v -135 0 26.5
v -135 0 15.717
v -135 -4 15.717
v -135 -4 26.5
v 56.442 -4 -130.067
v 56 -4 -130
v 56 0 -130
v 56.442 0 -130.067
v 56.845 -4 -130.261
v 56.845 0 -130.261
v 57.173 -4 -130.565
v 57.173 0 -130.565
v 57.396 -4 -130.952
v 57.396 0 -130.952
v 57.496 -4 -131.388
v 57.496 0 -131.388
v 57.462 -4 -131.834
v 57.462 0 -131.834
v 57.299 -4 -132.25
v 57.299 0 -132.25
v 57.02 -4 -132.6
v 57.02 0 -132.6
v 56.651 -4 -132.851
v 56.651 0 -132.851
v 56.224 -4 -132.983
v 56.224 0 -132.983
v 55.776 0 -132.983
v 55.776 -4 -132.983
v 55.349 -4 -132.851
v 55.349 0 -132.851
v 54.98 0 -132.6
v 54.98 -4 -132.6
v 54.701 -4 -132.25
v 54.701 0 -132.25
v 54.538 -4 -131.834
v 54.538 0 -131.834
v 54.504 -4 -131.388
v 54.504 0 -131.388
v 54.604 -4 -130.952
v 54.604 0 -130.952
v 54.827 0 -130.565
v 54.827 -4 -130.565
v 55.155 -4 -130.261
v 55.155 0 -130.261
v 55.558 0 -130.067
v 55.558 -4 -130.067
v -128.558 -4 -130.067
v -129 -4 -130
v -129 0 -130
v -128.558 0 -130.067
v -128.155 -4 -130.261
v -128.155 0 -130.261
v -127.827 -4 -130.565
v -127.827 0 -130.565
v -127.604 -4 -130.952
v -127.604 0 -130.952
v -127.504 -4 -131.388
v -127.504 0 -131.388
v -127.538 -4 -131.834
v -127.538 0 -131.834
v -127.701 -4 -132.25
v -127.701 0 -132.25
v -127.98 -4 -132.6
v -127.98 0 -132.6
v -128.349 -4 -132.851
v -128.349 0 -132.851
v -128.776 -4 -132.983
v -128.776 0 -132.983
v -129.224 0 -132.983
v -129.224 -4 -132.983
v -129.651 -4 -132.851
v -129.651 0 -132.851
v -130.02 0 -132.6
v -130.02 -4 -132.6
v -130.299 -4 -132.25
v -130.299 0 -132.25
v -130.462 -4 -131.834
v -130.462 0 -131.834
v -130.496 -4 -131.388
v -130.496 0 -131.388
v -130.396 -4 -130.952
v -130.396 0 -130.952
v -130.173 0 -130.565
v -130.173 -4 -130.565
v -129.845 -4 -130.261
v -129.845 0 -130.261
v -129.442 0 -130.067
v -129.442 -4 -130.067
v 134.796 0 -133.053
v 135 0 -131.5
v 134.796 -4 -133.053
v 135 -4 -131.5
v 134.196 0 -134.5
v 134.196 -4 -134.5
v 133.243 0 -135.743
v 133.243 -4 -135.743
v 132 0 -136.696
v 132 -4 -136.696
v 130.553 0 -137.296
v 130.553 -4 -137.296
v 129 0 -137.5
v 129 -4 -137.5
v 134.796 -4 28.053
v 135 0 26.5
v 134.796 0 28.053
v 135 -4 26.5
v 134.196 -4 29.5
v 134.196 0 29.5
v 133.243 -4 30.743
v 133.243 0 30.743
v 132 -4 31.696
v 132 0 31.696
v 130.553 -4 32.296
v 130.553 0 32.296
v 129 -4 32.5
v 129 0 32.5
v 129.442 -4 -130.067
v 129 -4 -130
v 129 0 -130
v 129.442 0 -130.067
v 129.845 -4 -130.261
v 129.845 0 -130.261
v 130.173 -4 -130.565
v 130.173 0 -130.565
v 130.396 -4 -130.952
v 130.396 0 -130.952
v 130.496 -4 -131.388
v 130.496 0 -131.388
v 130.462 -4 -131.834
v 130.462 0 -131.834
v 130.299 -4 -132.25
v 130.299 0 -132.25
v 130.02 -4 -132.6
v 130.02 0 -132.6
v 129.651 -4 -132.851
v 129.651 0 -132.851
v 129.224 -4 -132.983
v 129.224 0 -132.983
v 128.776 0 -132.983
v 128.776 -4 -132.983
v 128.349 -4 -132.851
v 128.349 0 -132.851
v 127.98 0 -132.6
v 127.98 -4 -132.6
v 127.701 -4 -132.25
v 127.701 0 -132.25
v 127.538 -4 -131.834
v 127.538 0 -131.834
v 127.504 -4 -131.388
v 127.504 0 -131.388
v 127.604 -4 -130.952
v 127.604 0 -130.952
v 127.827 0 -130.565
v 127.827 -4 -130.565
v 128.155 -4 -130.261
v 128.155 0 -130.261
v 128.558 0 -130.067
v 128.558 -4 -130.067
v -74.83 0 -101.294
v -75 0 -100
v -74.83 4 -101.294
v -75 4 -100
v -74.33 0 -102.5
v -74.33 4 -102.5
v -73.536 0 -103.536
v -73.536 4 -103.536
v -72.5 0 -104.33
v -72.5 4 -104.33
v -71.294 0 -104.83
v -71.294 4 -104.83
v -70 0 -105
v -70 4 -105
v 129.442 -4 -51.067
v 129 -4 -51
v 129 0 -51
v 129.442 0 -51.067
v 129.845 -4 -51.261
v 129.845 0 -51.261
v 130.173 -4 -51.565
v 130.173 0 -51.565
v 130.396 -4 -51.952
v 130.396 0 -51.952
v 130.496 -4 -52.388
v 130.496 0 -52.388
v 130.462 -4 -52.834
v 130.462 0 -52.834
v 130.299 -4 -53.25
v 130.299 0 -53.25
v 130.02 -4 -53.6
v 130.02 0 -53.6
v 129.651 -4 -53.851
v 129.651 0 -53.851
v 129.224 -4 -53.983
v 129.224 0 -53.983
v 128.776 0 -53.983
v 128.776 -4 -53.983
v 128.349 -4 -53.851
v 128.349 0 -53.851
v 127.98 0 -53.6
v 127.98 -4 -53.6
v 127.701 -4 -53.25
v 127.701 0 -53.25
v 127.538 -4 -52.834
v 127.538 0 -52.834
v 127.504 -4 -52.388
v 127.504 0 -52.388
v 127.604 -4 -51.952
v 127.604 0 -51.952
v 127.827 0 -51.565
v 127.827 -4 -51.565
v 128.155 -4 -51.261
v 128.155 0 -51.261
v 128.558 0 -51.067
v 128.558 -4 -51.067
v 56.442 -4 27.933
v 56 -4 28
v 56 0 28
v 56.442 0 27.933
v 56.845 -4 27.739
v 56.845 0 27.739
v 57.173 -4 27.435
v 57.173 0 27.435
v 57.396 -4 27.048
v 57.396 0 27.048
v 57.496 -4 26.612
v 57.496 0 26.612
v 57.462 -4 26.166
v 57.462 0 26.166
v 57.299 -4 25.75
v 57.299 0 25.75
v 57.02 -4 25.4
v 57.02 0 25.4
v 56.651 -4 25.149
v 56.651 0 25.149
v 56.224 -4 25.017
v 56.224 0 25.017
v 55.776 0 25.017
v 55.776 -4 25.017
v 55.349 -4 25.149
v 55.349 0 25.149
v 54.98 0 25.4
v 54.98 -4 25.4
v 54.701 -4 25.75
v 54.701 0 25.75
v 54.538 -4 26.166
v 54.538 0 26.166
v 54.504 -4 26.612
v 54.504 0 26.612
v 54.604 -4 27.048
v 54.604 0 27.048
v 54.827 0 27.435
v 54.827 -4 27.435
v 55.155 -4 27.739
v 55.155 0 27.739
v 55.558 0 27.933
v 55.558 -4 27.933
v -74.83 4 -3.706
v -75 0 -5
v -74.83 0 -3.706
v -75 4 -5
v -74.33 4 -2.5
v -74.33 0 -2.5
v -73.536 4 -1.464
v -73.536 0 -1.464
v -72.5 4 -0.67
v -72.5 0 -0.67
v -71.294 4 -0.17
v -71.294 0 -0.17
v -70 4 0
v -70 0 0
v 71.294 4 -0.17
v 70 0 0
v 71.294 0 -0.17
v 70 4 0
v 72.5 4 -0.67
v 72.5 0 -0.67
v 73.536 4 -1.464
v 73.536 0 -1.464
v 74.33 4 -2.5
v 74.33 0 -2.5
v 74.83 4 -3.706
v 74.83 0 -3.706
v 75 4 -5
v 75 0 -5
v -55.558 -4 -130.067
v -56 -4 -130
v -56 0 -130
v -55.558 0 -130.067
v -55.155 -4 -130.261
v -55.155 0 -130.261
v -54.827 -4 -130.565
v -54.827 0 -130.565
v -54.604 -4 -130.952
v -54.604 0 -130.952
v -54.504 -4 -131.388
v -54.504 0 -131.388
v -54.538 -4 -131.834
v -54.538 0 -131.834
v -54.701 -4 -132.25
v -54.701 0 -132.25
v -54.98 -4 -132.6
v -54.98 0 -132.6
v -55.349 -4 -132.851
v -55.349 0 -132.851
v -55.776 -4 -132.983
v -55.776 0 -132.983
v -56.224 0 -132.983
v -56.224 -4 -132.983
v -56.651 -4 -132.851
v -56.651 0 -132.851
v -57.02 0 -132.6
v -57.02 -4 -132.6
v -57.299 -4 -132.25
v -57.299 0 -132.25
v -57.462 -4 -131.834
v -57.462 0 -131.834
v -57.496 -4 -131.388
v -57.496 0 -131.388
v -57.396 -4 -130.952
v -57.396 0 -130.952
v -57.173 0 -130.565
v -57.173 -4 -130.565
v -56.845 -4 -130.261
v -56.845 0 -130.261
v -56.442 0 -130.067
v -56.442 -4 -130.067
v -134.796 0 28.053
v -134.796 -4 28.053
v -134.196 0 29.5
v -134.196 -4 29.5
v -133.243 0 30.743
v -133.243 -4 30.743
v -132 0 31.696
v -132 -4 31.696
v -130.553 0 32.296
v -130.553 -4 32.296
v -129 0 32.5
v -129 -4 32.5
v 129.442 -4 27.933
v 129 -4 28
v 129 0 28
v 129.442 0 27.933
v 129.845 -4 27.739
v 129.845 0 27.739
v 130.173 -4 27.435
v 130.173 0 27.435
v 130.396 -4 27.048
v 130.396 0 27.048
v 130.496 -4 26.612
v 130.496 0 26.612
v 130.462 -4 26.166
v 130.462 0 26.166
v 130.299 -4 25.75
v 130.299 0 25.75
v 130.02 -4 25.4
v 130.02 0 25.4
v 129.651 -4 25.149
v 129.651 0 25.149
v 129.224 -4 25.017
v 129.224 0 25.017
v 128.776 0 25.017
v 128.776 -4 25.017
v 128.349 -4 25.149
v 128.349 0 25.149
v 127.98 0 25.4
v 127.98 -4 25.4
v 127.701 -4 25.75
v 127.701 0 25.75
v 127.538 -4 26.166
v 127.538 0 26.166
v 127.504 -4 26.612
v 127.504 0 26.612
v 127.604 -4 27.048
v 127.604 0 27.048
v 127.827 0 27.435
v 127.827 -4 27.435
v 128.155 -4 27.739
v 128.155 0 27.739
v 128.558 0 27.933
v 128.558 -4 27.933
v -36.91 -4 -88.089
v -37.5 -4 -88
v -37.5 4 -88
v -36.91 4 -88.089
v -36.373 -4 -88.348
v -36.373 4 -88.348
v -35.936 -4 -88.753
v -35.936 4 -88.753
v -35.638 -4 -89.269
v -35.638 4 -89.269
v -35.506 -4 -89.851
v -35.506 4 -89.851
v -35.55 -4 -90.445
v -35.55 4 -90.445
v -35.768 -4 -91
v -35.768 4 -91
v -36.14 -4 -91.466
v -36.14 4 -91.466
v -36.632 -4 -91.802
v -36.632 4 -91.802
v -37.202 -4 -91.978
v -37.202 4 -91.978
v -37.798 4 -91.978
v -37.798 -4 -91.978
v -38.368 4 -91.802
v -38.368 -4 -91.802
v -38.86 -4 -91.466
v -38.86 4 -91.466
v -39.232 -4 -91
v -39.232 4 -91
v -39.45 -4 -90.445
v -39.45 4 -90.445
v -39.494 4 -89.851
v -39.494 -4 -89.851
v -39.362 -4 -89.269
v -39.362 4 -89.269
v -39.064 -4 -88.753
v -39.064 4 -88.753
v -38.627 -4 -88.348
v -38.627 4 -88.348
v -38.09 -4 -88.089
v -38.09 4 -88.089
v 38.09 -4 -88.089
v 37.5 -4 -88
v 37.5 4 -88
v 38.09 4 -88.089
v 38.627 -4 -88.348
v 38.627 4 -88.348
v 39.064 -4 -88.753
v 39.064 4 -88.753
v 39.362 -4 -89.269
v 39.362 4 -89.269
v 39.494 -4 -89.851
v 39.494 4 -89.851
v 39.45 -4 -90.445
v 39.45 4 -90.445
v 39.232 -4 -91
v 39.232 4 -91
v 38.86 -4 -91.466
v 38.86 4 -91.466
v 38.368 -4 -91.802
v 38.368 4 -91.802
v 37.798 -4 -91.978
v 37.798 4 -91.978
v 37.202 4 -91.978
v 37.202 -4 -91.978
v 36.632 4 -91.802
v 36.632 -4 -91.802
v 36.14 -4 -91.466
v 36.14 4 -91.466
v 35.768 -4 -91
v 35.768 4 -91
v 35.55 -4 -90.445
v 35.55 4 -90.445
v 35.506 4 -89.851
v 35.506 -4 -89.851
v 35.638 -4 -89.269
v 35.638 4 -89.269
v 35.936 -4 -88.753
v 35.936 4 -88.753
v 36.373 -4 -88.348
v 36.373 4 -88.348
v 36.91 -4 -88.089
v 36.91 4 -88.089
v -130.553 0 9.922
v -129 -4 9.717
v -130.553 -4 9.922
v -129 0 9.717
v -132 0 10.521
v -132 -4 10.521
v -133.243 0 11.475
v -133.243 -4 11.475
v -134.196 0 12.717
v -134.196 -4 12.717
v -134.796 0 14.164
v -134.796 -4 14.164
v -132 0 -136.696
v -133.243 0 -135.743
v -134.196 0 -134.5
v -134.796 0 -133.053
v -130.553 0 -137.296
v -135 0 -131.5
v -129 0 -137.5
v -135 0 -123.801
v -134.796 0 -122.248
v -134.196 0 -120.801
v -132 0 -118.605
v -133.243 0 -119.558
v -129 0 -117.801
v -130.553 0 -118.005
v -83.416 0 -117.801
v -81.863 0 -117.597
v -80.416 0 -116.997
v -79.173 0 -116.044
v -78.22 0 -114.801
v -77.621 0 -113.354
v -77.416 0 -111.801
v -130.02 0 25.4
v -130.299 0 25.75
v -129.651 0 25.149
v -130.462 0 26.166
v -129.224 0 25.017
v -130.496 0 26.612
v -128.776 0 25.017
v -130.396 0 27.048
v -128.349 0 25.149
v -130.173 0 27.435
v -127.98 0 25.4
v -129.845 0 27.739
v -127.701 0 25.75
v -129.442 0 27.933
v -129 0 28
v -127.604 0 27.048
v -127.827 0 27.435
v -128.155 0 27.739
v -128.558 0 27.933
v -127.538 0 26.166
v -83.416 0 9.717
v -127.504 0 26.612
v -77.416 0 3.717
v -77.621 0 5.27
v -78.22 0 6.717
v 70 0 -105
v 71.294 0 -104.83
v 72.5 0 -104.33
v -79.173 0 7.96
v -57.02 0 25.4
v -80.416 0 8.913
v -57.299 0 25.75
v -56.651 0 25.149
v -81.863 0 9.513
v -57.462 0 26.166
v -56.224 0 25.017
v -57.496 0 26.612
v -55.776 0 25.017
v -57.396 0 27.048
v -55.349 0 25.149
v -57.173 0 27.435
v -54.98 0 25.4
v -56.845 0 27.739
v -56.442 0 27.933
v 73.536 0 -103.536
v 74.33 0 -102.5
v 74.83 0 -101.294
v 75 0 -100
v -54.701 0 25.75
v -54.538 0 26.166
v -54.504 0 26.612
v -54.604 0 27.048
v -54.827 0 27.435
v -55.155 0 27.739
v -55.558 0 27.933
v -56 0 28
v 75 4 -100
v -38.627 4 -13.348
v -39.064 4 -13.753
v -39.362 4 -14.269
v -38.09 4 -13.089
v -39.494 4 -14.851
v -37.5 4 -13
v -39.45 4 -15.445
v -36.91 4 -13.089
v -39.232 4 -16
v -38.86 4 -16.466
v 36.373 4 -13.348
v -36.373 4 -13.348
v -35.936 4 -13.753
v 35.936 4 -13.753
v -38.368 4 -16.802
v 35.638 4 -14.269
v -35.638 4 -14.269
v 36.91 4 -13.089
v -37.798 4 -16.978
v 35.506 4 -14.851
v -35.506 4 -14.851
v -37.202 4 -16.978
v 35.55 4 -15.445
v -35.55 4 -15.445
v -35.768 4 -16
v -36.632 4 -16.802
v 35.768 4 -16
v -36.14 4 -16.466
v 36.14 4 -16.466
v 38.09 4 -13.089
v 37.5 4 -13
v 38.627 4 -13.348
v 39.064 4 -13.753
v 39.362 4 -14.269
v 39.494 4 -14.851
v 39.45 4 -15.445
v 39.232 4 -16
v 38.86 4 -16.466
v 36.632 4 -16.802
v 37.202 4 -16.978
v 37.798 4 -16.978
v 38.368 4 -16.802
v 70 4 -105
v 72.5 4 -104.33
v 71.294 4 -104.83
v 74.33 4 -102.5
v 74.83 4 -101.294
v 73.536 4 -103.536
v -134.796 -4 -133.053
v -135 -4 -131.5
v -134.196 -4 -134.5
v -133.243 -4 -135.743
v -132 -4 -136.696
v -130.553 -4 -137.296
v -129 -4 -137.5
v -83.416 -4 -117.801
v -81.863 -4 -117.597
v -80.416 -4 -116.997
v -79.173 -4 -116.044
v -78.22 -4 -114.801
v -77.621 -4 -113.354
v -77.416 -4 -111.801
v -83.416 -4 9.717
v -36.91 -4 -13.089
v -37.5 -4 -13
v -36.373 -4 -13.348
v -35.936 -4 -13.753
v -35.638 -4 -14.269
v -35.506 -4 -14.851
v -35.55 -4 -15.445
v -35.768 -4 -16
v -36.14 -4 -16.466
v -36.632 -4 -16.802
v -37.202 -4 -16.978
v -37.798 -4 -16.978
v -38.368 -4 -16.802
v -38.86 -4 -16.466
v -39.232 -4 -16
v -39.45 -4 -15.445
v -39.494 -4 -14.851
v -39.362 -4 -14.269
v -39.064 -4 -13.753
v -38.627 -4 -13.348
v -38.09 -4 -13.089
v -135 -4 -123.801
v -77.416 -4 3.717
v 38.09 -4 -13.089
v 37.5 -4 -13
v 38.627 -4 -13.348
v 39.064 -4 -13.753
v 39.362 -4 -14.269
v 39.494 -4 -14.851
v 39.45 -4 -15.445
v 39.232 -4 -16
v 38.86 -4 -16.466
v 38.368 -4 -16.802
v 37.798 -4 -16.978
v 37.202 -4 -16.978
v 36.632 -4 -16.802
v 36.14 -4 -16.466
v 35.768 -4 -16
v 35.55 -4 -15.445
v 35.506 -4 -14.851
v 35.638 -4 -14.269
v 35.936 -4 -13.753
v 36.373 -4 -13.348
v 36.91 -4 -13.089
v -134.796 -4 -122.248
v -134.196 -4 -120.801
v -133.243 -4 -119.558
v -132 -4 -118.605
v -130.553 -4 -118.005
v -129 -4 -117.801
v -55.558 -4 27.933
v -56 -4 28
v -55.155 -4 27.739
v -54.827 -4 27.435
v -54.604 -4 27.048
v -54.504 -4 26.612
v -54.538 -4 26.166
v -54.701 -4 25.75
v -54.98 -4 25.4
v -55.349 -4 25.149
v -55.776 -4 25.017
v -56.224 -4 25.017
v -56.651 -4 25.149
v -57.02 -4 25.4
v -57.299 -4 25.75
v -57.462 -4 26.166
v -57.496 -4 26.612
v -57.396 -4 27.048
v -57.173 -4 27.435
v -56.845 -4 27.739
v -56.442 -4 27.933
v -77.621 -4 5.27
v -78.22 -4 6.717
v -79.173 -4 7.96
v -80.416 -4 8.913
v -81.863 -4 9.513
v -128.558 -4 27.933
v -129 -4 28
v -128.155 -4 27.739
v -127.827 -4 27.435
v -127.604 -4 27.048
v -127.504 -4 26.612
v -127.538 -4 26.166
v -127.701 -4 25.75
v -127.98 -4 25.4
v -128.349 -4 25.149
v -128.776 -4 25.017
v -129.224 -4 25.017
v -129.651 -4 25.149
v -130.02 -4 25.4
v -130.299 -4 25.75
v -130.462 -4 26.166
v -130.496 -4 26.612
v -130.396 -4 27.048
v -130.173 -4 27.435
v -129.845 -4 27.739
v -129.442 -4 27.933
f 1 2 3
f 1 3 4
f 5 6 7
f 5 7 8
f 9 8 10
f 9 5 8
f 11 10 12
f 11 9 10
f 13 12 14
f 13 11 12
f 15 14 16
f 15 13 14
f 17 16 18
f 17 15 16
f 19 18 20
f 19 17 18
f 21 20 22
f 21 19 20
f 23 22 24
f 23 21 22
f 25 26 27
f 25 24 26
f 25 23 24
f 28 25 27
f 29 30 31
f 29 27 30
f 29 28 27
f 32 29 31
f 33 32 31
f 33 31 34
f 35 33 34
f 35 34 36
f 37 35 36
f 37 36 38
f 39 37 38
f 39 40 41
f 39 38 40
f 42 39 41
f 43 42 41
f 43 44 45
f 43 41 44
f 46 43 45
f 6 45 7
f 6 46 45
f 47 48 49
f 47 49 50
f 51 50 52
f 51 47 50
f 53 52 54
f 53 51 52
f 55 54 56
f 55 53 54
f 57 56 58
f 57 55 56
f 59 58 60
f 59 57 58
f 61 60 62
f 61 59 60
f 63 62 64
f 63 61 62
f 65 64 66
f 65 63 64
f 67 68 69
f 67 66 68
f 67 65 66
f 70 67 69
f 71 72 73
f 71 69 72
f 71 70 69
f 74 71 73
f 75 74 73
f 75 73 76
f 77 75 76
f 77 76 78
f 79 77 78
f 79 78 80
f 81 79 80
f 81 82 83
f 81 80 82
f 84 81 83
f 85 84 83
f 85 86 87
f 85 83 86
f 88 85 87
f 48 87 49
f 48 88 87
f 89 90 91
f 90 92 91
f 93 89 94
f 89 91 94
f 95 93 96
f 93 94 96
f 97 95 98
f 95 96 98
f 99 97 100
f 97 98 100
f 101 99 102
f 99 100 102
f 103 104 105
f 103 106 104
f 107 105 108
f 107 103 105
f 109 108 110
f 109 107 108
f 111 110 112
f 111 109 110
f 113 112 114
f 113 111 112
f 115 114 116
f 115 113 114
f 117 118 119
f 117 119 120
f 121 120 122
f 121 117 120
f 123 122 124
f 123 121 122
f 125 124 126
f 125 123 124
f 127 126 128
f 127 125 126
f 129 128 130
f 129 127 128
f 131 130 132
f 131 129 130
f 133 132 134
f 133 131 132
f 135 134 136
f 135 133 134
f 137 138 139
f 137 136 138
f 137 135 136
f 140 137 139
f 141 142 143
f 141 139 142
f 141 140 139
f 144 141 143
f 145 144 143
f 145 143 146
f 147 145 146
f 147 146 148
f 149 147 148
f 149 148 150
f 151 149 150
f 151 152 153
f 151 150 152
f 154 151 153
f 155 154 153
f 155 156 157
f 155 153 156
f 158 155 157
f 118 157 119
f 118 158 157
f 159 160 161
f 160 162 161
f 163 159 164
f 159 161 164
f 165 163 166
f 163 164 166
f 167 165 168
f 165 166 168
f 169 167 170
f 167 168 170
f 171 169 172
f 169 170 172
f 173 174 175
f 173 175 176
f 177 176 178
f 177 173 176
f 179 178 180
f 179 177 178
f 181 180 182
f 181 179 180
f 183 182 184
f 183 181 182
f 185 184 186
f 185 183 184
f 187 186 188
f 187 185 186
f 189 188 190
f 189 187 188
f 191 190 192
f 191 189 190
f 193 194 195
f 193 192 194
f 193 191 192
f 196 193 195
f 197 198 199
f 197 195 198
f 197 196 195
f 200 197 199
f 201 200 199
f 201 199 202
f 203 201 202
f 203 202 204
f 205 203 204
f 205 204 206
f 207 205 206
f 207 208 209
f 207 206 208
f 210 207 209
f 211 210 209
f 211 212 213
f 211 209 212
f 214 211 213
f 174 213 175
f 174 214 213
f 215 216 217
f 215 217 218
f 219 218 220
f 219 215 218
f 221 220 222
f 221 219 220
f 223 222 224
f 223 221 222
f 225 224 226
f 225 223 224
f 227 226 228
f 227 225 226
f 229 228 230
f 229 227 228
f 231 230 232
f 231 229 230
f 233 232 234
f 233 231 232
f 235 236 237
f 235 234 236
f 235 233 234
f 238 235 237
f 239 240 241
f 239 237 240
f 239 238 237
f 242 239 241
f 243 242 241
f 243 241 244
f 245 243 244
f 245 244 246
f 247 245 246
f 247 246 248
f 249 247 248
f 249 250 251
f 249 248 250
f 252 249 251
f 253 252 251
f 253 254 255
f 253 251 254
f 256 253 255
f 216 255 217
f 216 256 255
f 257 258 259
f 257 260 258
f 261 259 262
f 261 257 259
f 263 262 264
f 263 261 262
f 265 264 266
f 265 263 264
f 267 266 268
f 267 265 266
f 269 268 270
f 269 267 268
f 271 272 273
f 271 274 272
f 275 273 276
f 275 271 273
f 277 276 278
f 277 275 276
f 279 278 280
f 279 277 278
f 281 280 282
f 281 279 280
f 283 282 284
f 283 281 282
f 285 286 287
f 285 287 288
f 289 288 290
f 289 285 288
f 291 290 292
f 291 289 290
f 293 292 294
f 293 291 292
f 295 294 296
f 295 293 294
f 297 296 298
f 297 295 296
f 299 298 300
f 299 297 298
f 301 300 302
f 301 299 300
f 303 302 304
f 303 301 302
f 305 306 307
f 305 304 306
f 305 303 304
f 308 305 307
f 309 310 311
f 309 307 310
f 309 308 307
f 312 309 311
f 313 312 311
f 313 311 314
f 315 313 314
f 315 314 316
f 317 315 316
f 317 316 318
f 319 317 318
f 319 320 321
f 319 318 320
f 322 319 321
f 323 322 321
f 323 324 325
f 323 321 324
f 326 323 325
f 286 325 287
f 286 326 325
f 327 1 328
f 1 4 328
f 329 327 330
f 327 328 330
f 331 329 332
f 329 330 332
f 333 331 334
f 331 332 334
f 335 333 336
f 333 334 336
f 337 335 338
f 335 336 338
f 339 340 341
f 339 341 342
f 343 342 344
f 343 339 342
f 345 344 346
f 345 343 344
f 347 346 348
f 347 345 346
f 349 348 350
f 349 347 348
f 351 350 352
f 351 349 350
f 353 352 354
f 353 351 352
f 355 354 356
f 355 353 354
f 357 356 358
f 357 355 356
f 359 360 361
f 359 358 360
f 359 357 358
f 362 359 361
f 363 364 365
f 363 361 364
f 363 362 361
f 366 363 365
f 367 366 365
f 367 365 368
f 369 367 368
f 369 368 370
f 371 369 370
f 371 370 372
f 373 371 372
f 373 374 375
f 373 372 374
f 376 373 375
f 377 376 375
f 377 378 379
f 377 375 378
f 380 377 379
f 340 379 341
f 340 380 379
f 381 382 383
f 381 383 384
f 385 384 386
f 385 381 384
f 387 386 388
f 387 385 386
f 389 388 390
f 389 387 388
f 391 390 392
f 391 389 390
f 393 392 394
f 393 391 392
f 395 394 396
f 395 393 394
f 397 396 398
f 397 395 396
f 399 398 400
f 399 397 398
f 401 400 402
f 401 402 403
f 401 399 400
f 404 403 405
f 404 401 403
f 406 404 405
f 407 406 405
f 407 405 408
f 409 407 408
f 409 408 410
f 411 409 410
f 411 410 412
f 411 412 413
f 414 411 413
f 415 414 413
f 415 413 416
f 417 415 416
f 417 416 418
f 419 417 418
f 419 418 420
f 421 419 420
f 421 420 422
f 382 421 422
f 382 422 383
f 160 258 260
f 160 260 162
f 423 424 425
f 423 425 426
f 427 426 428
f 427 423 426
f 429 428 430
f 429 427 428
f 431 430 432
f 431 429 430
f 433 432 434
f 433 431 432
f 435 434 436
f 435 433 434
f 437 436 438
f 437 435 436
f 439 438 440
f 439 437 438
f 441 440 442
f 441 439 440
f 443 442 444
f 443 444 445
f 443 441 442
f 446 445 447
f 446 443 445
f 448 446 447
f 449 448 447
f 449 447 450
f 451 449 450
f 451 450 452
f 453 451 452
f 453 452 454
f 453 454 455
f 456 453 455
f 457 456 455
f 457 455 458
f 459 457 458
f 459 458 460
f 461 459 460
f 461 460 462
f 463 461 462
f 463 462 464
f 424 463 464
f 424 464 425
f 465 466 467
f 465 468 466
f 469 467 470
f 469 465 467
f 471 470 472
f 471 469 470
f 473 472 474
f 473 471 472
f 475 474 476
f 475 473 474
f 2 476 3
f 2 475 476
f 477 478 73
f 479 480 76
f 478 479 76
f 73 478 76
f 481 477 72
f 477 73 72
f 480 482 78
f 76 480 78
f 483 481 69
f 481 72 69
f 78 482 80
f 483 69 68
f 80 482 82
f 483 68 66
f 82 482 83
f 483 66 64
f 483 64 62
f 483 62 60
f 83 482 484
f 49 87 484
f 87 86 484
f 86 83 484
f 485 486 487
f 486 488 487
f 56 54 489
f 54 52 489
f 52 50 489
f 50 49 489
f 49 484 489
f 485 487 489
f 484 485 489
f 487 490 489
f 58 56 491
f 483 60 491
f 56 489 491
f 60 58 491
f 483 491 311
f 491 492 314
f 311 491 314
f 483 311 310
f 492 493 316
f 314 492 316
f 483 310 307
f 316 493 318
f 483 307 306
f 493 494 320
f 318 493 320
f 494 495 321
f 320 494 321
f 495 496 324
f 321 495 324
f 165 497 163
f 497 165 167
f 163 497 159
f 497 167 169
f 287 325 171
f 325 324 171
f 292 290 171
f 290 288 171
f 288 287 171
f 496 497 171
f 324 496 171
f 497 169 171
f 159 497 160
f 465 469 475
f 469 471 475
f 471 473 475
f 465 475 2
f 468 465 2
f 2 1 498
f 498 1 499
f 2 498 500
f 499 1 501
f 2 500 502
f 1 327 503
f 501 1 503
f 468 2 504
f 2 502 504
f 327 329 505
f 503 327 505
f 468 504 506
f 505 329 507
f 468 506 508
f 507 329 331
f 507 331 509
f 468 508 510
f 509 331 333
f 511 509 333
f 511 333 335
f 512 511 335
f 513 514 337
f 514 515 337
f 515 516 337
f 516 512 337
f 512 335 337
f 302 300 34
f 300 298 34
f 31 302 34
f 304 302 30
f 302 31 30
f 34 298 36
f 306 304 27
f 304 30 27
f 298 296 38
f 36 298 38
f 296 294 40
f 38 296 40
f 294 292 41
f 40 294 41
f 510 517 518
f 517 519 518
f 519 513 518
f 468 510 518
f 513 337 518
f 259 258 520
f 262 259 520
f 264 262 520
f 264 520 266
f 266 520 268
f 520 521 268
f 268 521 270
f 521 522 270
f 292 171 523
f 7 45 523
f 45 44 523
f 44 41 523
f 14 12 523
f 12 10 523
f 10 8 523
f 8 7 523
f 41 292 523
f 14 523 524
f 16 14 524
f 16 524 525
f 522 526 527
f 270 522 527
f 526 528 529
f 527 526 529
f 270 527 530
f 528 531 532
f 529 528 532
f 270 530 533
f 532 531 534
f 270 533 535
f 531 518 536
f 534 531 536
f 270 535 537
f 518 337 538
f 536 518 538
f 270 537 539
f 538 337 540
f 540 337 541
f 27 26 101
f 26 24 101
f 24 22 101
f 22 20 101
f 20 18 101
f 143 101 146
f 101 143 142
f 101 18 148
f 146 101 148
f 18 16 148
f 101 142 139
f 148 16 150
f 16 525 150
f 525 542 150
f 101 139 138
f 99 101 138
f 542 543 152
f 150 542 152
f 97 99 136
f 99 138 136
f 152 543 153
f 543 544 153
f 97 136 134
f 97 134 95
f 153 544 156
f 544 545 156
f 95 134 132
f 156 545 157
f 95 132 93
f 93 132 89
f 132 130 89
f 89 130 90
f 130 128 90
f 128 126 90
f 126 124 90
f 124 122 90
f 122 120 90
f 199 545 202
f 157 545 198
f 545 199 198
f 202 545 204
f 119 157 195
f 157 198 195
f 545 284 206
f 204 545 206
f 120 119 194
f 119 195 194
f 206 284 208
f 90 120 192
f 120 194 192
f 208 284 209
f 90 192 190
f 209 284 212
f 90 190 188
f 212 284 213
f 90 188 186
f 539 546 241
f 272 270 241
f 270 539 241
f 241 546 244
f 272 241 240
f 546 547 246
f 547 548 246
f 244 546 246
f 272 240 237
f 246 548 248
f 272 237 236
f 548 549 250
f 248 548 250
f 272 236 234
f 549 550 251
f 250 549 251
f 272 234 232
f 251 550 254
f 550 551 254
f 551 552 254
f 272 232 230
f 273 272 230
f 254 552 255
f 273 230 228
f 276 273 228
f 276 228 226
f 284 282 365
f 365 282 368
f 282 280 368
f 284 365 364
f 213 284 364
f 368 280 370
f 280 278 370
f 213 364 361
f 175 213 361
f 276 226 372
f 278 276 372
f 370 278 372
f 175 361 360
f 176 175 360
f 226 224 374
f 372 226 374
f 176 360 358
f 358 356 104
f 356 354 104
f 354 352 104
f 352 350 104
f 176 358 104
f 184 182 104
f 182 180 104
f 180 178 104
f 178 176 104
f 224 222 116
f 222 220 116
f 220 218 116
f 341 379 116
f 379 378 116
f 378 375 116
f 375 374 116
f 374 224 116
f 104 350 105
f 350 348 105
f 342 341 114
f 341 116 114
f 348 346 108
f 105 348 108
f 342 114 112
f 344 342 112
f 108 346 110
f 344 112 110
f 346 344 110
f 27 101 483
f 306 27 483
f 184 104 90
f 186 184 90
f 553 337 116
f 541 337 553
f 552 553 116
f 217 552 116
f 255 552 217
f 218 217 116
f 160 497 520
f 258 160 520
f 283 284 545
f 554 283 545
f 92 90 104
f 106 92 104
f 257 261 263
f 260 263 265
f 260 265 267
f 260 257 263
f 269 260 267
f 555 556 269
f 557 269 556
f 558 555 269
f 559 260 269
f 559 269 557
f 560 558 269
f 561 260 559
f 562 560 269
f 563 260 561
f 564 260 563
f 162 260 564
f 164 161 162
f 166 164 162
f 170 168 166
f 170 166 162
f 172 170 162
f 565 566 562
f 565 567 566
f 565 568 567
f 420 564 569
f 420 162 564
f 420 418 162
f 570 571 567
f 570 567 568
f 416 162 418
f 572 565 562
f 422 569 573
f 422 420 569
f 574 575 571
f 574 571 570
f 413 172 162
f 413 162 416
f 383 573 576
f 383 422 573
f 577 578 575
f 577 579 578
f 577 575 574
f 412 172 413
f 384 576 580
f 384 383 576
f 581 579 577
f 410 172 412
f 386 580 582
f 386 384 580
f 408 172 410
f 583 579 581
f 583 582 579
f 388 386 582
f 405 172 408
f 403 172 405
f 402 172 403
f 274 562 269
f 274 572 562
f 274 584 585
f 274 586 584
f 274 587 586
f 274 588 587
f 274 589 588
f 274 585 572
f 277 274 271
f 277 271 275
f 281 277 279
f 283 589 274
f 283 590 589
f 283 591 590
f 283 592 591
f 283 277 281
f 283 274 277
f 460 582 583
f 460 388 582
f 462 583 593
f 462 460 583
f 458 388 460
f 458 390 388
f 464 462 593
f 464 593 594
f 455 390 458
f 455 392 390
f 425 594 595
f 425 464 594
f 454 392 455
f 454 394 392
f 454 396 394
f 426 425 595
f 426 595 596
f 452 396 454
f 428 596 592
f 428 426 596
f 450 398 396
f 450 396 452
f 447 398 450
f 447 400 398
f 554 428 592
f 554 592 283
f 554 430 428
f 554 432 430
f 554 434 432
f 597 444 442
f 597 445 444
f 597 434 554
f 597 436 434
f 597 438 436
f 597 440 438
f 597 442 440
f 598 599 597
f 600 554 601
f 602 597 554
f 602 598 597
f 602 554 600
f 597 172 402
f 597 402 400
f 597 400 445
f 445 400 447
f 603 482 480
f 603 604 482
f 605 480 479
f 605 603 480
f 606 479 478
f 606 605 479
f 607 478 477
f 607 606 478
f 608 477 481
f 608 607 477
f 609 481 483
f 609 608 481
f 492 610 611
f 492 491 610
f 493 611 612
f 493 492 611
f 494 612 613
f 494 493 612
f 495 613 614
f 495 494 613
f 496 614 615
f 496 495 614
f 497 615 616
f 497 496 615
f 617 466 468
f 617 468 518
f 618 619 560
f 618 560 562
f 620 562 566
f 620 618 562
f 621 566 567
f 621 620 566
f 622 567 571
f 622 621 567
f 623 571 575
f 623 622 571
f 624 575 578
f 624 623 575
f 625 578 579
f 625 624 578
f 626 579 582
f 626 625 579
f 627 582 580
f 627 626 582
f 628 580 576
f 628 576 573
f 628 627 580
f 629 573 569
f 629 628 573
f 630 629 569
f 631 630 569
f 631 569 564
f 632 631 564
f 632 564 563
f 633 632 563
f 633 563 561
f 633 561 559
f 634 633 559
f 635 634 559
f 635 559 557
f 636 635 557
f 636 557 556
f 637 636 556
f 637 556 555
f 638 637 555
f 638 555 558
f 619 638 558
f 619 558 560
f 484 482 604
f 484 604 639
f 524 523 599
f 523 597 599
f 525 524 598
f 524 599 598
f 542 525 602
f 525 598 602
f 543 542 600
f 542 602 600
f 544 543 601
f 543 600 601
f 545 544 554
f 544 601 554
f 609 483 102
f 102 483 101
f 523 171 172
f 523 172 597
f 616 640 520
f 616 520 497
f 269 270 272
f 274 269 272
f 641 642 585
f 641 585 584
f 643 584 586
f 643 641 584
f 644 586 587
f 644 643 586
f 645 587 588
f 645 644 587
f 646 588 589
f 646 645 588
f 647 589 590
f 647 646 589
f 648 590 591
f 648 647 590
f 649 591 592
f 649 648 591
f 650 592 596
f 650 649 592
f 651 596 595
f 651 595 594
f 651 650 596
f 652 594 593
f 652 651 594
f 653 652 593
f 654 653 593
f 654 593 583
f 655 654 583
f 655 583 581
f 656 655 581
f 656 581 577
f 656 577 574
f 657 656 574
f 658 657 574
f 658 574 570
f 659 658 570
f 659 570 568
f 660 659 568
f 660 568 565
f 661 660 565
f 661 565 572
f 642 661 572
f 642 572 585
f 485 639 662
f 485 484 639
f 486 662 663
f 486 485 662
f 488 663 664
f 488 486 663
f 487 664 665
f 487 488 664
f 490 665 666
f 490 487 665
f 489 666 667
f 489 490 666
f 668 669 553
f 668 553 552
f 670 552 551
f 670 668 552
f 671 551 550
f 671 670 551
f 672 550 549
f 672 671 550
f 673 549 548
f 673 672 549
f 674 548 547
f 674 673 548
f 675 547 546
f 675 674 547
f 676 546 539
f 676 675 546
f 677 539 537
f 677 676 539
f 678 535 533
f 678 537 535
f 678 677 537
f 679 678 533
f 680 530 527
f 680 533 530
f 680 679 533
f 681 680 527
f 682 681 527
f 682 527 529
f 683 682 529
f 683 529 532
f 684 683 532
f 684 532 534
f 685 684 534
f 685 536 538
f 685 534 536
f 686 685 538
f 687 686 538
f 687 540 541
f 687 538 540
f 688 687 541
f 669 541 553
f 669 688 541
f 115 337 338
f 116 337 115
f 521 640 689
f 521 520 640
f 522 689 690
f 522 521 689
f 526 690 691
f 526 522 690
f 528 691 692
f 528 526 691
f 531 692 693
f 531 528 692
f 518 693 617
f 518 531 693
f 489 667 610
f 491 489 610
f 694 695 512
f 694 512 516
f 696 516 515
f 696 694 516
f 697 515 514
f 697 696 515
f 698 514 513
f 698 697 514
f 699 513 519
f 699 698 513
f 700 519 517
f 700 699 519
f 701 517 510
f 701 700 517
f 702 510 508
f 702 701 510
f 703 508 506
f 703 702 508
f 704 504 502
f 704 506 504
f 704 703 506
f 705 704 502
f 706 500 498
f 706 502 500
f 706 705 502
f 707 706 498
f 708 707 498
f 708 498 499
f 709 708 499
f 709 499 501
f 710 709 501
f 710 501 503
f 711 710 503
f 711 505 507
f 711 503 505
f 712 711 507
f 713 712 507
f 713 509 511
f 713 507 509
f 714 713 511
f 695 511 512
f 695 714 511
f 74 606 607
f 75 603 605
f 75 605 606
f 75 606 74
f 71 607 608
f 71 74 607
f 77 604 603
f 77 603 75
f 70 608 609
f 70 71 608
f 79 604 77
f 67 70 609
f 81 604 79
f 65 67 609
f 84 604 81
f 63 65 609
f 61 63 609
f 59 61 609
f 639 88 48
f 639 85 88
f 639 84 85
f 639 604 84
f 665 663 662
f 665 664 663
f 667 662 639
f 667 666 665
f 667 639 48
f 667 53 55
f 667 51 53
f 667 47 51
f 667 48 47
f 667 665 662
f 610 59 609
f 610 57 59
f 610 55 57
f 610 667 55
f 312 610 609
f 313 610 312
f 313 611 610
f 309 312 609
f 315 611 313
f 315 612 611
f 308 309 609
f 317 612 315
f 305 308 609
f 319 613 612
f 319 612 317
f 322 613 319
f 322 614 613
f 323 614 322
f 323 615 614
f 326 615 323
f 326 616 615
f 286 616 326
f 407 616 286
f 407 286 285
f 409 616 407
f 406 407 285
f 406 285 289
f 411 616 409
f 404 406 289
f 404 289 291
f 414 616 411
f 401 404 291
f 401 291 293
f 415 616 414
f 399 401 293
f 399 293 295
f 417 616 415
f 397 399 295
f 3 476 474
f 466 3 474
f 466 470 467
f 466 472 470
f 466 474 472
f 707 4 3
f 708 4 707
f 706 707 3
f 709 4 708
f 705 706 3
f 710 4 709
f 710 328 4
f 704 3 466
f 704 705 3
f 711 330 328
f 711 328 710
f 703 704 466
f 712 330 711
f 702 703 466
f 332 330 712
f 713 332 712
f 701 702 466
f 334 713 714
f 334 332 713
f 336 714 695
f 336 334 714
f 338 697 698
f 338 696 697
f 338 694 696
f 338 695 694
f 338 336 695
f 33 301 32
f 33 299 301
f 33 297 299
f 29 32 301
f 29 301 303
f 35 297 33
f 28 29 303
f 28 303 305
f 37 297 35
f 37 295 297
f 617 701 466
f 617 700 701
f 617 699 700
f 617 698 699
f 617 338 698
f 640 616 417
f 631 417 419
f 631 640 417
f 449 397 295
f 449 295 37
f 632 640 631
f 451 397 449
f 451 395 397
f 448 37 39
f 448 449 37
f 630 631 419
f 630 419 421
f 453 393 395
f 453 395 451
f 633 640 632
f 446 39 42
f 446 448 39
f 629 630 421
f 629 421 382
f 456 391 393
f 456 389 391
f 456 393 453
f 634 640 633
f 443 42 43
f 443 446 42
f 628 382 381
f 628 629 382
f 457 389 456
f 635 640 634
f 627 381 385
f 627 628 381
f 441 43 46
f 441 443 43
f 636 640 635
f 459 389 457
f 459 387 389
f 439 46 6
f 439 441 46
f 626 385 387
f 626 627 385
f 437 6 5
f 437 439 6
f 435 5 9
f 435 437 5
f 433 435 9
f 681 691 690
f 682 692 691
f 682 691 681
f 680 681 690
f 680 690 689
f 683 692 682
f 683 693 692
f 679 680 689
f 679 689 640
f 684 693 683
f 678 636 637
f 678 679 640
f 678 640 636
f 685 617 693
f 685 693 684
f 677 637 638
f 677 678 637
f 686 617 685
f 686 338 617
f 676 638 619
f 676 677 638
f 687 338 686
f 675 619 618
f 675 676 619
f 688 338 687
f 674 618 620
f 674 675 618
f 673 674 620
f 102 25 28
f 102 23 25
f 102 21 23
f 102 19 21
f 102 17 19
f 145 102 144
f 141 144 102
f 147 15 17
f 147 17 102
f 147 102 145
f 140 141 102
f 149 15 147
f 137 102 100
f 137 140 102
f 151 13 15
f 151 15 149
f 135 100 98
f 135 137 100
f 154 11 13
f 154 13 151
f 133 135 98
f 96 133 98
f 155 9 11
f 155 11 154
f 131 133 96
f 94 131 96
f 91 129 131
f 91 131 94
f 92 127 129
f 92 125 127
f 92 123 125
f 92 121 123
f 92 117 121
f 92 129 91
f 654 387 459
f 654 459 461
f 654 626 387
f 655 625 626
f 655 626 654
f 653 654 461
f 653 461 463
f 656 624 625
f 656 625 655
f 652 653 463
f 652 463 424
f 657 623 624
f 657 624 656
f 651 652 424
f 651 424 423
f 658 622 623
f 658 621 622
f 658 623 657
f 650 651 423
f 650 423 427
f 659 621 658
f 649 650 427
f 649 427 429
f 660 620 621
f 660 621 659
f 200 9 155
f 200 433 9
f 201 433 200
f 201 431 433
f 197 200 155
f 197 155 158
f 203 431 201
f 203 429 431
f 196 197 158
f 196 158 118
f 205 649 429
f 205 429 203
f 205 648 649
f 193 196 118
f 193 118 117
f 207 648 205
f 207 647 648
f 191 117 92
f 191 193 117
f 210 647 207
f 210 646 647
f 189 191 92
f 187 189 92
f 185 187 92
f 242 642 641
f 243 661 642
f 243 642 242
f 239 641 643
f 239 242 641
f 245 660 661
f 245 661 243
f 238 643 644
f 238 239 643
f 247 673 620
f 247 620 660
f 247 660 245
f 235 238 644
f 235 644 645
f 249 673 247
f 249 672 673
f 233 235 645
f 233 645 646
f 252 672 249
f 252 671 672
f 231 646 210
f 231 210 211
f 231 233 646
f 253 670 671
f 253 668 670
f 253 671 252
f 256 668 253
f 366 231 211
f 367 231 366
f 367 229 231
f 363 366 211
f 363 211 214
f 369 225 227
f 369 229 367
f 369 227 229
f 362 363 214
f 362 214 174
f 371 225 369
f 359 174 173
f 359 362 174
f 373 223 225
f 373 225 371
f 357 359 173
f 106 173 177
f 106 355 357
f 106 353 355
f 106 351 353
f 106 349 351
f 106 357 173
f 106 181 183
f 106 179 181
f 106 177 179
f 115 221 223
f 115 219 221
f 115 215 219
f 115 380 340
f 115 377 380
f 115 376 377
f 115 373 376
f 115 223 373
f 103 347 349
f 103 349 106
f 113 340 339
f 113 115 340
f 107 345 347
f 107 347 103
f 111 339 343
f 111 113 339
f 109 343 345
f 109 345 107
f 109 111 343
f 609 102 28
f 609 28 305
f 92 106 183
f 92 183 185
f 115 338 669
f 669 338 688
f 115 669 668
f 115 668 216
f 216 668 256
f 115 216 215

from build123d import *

# Parameters (mm, degrees)
SKETCH_1_W               = 150
SKETCH_1_H               = 105
SKETCH_1_R               = 2
EXTRUDE_1_DEPTH          = 4
SKETCH_2_W               = 270
SKETCH_2_H               = 170
EXTRUDE_2_DEPTH          = 4
CUT_EXTRUDE_2_DEPTH      = 193.860701025
CUT_EXTRUDE_2_DEPTH_BACK = 193.860701025
SKETCH_3_R               = 2
FILLET_1_R               = 6
CUT_EXTRUDE_3_DEPTH      = 193.736218703
CUT_EXTRUDE_3_DEPTH_BACK = 193.736218703
SKETCH_4_R               = 1.5
CUT_EXTRUDE_4_DEPTH      = 193.736218703
CUT_EXTRUDE_4_DEPTH_BACK = 193.736218703
SKETCH_5_W               = 57.583887605
SKETCH_5_H               = 127.518164053
FILLET_2_R               = 6
FILLET_3_R               = 5


with BuildPart() as part:
    # 草图1 → 凸台-拉伸1 (new body)
    with BuildSketch(Plane(origin=(0, 0, 0), x_dir=(1, 0, 0), z_dir=(0, 1, 0))):
        with Locations((0, 52.5)):
            Rectangle(SKETCH_1_W, SKETCH_1_H)
        with Locations(Location((-37.5, 90, 0), (0, 0, 270))):
            Circle(SKETCH_1_R, mode=Mode.SUBTRACT)
        with Locations(Location((-37.5, 15, 0), (0, 0, 270))):
            Circle(SKETCH_1_R, mode=Mode.SUBTRACT)
        with Locations(Location((37.5, 15, 0), (0, 0, 270))):
            Circle(SKETCH_1_R, mode=Mode.SUBTRACT)
        with Locations(Location((37.5, 90, 0), (0, 0, 270))):
            Circle(SKETCH_1_R, mode=Mode.SUBTRACT)
    extrude(amount=EXTRUDE_1_DEPTH)

    # 草图2 → 凸台-拉伸2 (add)
    with BuildSketch(Plane.XZ):
        with Locations((0, -52.5)):
            Rectangle(SKETCH_2_W, SKETCH_2_H)
    extrude(amount=EXTRUDE_2_DEPTH)

    # 草图3 → 切除-拉伸2 (cut, two sides: drawn at the far end of the back side and taken through both)
    with BuildSketch(Plane(origin=(0, 4, 0), x_dir=(1, 0, 0), z_dir=(0, 1, 0)).offset(-CUT_EXTRUDE_2_DEPTH_BACK)):
        with Locations(Location((-37.5, 90, 0), (0, 0, 270))):
            Circle(SKETCH_3_R)
        with Locations(Location((37.5, 90, 0), (0, 0, 270))):
            Circle(SKETCH_3_R)
        with Locations(Location((-37.5, 15, 0), (0, 0, 270))):
            Circle(SKETCH_3_R)
        with Locations(Location((37.5, 15, 0), (0, 0, 270))):
            Circle(SKETCH_3_R)
    extrude(amount=CUT_EXTRUDE_2_DEPTH + CUT_EXTRUDE_2_DEPTH_BACK, mode=Mode.SUBTRACT)

    # 圆角1
    fillet_1_edges = [part.edges().sort_by_distance(p)[0] for p in [
        (135, -2, -137.5),
        (135, -2, 32.5),
        (-135, -2, 32.5),
        (-135, -2, -137.5),
    ]]
    fillet(fillet_1_edges, radius=FILLET_1_R)

    # 草图4 → 切除-拉伸3 (cut, two sides: drawn at the far end of the back side and taken through both)
    with BuildSketch(Plane(origin=(0, 0, 0), x_dir=(1, 0, 0), z_dir=(0, 1, 0)).offset(-CUT_EXTRUDE_3_DEPTH_BACK)):
        with Locations(Location((-129, 52.5, 0), (0, 0, 270))):
            Circle(SKETCH_4_R)
        with Locations(Location((-129, -26.5, 0), (0, 0, 270))):
            Circle(SKETCH_4_R)
        with Locations(Location((-56, -26.5, 0), (0, 0, 270))):
            Circle(SKETCH_4_R)
        with Locations(Location((56, -26.5, 0), (0, 0, 270))):
            Circle(SKETCH_4_R)
        with Locations(Location((129, -26.5, 0), (0, 0, 270))):
            Circle(SKETCH_4_R)
        with Locations(Location((129, 52.5, 0), (0, 0, 270))):
            Circle(SKETCH_4_R)
        with Locations(Location((56, 131.5, 0), (0, 0, 270))):
            Circle(SKETCH_4_R)
        with Locations(Location((129, 131.5, 0), (0, 0, 270))):
            Circle(SKETCH_4_R)
        with Locations(Location((-56, 131.5, 0), (0, 0, 270))):
            Circle(SKETCH_4_R)
        with Locations(Location((-129, 131.5, 0), (0, 0, 270))):
            Circle(SKETCH_4_R)
    extrude(amount=CUT_EXTRUDE_3_DEPTH + CUT_EXTRUDE_3_DEPTH_BACK, mode=Mode.SUBTRACT)

    # 草图5 → 切除-拉伸4 (cut, two sides: drawn at the far end of the back side and taken through both)
    with BuildSketch(Plane(origin=(0, 0, 0), x_dir=(1, 0, 0), z_dir=(0, 1, 0)).offset(-CUT_EXTRUDE_4_DEPTH_BACK)):
        with Locations((-106.208056197, 54.041877238)):
            Rectangle(SKETCH_5_W, SKETCH_5_H)
    extrude(amount=CUT_EXTRUDE_4_DEPTH + CUT_EXTRUDE_4_DEPTH_BACK, mode=Mode.SUBTRACT)

    # 圆角2
    fillet_2_edges = [part.edges().sort_by_distance(p)[0] for p in [
        (-135, -2, 9.717204788),
        (-77.416112395, -2, -117.800959265),
        (-135, -2, -117.800959265),
        (-77.416112395, -2, 9.717204788),
    ]]
    fillet(fillet_2_edges, radius=FILLET_2_R)

    # 圆角3
    fillet_3_edges = [part.edges().sort_by_distance(p)[0] for p in [
        (-75, 2, -105),
        (75, 2, -105),
        (75, 2, 0),
        (-75, 2, 0),
    ]]
    fillet(fillet_3_edges, radius=FILLET_3_R)


solid = part.part
